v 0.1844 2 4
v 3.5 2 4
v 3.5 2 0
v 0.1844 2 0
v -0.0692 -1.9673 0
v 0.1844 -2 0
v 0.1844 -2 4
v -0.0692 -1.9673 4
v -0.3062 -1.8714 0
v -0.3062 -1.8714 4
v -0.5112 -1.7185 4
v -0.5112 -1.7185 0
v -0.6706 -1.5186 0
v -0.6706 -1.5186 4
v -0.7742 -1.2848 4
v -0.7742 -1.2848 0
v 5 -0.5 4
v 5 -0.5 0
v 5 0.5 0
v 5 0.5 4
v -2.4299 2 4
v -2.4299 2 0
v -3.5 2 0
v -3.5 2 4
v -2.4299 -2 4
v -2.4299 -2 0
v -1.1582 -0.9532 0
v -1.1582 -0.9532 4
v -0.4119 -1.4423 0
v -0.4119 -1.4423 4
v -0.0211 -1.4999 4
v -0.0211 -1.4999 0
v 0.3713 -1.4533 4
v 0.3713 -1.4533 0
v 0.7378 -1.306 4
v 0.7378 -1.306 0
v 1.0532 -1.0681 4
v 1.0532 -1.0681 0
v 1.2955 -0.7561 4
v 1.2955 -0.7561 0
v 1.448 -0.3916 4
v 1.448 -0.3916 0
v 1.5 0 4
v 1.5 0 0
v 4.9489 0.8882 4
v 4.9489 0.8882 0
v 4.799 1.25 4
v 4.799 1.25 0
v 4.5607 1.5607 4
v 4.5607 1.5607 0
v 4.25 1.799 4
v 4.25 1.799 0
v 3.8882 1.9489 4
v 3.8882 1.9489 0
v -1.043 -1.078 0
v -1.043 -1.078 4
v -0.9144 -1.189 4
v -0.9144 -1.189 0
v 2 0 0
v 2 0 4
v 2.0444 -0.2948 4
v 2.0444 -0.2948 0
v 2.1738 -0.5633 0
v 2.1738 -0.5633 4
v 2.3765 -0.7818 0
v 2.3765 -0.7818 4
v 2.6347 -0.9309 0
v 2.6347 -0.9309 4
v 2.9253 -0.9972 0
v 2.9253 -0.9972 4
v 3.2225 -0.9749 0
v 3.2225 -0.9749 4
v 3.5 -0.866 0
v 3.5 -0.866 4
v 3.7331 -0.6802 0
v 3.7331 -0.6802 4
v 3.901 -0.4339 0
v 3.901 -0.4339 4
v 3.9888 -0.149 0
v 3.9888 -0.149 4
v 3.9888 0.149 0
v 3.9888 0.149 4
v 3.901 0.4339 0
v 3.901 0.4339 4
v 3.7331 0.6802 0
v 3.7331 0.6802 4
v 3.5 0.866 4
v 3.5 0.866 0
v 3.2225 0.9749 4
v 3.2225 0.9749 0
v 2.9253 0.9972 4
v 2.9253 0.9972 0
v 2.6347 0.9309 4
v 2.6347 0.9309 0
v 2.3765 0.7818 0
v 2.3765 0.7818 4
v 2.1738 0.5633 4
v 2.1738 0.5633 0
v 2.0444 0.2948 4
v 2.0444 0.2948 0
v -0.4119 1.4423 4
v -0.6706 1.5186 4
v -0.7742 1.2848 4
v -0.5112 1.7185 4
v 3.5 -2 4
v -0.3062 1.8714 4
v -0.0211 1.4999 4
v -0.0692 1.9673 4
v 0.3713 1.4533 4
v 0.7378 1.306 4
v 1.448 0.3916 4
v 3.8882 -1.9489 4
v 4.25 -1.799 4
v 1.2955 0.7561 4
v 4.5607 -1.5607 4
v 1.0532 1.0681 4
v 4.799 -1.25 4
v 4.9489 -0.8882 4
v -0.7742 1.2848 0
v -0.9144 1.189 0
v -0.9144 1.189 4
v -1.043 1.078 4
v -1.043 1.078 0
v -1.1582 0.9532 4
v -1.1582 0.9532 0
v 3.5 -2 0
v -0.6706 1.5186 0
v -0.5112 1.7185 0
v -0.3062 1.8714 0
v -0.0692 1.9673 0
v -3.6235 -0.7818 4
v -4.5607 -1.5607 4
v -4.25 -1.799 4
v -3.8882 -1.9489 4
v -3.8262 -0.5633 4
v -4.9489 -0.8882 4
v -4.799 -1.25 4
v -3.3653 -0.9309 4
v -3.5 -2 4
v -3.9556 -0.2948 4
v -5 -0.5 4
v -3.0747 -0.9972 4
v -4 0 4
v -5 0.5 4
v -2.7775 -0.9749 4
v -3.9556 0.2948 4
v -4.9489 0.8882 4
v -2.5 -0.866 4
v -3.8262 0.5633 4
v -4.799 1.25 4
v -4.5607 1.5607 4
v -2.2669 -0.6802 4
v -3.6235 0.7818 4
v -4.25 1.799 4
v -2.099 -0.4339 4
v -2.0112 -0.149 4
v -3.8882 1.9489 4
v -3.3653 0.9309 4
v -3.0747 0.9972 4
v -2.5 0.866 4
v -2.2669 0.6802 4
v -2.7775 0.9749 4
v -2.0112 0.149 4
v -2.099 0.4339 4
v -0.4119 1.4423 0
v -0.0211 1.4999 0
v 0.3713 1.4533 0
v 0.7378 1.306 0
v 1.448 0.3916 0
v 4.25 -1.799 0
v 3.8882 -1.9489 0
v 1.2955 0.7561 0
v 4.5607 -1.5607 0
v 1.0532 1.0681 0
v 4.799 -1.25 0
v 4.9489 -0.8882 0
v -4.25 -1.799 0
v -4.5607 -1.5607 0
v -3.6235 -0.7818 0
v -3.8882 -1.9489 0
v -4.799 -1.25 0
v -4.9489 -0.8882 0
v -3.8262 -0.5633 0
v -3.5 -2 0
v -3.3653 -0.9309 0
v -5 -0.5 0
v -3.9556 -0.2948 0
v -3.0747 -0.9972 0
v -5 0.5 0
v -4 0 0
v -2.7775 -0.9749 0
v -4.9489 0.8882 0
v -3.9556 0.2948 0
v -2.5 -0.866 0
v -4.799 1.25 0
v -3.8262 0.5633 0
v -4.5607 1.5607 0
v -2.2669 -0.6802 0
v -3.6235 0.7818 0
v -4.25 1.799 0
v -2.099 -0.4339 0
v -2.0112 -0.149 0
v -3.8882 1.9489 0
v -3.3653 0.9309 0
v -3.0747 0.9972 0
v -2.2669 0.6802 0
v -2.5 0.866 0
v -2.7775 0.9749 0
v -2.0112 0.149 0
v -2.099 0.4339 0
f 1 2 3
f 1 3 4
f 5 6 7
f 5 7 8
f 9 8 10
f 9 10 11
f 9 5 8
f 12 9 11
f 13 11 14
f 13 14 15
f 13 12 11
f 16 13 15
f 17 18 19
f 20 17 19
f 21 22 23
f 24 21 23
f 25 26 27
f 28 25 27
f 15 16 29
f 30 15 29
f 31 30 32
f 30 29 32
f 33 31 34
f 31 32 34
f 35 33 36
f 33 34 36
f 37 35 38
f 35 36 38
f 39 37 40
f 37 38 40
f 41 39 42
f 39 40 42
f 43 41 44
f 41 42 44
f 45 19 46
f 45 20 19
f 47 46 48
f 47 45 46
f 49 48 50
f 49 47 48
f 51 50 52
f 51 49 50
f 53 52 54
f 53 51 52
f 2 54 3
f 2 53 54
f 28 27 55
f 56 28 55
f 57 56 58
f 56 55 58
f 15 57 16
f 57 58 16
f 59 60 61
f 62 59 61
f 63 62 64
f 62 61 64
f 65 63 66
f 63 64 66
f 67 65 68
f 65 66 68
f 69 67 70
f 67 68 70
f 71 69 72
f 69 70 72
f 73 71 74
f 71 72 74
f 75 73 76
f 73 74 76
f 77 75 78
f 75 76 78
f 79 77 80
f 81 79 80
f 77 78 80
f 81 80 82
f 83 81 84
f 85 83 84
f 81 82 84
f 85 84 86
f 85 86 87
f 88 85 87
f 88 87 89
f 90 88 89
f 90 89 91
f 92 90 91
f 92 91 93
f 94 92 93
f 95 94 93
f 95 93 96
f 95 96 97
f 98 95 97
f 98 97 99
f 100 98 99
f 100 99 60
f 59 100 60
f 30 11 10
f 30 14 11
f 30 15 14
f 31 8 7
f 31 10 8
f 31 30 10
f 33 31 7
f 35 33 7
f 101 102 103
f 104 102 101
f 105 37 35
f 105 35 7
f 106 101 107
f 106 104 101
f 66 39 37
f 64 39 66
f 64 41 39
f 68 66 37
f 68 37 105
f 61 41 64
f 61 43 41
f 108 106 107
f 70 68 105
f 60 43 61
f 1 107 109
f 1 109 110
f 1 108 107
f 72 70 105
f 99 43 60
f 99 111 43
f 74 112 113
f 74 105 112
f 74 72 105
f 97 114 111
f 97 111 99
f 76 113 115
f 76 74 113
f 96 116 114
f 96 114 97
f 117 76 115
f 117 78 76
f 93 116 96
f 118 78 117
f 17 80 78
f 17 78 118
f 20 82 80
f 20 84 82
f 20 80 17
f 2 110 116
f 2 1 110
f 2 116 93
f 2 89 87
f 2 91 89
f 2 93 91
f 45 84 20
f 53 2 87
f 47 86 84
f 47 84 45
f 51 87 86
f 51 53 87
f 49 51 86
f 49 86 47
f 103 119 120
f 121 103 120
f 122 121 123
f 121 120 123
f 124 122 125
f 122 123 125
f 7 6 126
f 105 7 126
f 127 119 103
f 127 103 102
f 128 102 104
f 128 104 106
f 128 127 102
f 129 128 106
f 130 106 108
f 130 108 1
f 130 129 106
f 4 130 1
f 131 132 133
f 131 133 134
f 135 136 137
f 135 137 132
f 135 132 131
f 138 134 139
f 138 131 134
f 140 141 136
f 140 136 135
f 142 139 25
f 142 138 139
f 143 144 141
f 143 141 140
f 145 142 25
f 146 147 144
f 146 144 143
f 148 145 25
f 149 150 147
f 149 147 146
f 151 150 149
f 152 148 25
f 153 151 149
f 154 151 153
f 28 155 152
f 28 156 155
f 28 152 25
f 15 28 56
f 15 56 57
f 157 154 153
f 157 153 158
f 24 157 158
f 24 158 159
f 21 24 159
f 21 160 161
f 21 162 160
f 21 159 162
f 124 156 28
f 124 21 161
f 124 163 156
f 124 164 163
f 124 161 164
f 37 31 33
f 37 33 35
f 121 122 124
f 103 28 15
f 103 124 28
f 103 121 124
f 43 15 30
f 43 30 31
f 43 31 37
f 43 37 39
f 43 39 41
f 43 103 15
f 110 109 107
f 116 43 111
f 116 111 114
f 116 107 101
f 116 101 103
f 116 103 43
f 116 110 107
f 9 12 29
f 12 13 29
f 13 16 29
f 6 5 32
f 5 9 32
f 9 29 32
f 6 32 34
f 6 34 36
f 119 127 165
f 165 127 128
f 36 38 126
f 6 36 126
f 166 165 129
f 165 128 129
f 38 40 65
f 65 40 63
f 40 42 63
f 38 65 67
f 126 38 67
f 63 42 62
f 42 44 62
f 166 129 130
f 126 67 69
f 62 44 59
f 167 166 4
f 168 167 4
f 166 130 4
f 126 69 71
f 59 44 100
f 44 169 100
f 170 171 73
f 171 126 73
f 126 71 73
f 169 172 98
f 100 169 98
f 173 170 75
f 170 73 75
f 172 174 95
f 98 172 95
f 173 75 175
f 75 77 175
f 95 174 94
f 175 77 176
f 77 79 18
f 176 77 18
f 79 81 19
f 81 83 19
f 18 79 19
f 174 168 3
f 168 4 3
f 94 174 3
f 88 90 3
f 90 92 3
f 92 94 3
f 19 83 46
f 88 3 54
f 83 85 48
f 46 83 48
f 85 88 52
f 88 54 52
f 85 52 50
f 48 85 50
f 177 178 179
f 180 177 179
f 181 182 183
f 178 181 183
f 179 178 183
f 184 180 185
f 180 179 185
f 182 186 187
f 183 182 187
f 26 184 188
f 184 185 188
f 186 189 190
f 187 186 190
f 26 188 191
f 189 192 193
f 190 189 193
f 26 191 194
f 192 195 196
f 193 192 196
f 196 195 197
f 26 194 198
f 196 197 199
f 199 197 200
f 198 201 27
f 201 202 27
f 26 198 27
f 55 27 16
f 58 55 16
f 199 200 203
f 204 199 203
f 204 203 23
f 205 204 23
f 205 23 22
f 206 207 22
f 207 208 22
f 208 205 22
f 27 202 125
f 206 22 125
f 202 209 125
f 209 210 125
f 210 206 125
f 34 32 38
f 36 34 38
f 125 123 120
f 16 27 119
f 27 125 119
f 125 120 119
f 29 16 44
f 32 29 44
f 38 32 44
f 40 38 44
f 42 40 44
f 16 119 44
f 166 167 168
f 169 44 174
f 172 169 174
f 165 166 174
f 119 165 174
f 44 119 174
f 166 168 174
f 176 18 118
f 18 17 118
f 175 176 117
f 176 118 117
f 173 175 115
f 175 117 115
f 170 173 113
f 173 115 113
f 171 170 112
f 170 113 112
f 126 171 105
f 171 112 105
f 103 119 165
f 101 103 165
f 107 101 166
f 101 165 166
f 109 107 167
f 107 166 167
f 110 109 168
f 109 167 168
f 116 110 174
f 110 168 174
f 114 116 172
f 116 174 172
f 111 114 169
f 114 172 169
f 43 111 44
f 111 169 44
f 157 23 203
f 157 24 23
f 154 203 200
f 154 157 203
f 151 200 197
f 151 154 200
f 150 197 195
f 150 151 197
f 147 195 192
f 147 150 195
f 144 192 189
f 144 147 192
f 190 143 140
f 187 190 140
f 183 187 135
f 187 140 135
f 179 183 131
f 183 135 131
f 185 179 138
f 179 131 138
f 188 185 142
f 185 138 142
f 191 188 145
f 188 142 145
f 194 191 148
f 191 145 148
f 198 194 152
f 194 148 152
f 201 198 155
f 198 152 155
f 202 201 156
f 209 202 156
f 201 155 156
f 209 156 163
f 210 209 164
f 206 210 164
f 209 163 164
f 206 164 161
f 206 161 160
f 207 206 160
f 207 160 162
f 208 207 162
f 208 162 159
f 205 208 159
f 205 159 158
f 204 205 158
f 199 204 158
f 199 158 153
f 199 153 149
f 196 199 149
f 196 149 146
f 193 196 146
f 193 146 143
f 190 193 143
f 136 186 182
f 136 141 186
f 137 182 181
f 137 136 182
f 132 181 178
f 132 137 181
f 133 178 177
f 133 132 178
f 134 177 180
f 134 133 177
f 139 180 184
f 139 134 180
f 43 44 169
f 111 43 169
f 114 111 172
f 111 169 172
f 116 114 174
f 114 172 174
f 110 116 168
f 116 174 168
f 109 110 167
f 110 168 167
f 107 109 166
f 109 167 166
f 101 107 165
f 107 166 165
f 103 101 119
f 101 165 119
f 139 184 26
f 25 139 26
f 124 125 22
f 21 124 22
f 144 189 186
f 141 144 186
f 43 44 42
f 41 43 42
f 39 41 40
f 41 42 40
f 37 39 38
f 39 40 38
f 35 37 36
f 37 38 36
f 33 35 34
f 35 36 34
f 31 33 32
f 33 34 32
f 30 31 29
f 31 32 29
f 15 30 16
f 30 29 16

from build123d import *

# Parameters (mm, degrees)
F1_DEPTH    = 4
F2_DEPTH    = 4
F3_R        = 1.5
F3_2_R      = 1.5
F4_T1_DEPTH = 13.1378583471
F5_D        = 2
F5_2_D      = 2


# Not quite as in the source:
# - a fillet or chamfer that OpenCascade refuses, or shapes differently, is made with other operations: its cross-section is extruded or revolved along the edge and cut away or added


with BuildPart() as f1:
    # F0 (on Top) → F1 (new body)
    with BuildSketch(Plane.XY):
        with BuildLine():
            Line((-1.1581599978, 0.9532394345), (-2.4299456272, 2))
            Line((-2.4299456272, 2), (-5, 2))
            Line((-5, 2), (-5, -2))
            Line((-5, -2), (-2.4299456272, -2))
            Line((-2.4299456272, -2), (-1.1581599978, -0.9532394345))
            ThreePointArc((-1.1581599978, -0.9532394345), (-1.5, 0), (-1.1581599978, 0.9532394345))
        make_face()
        with BuildLine():
            ThreePointArc((1.5, 0), (0.7378123545, 1.3059988245), (-0.7741772393, 1.2847760902))
            ThreePointArc((-0.7741772393, 1.2847760902), (-0.9802861511, 1.135358561), (-1.1581599978, 0.9532394345))
            ThreePointArc((-1.1581599978, 0.9532394345), (-1.5, 0), (-1.1581599978, -0.9532394345))
            ThreePointArc((-1.1581599978, -0.9532394345), (-0.9802861511, -1.135358561), (-0.7741772393, -1.2847760902))
            ThreePointArc((-0.7741772393, -1.2847760902), (0.7378123545, -1.3059988245), (1.5, 0))
        make_face()
    extrude(amount=F1_DEPTH)

    # F3
    f3_edges = [f1.edges().sort_by_distance(p)[0] for p in [
        (-5, -2, 2),
        (-5, 2, 2),
    ]]
    fillet(f3_edges, radius=F3_R)

    # F5 (through all)
    with Locations(Plane(origin=(0, 0, 0), x_dir=(1, 0, 0), z_dir=(0, 0, -1))):
        with Locations((3, 0), (-3, 0)):
            Hole(F5_D / 2)


with BuildPart() as f2:
    # F0 (on Top) → F2 (new body)
    with BuildSketch(Plane.XY):
        with BuildLine():
            Line((5, -2), (5, 2))
            Line((5, 2), (-1.6431548453, 2))
            Line((-1.6431548453, 2), (-0.7741772393, 1.2847760902))
            ThreePointArc((-0.7741772393, 1.2847760902), (0.7378123545, 1.3059988245), (1.5, 0))
            ThreePointArc((1.5, 0), (0.7378123545, -1.3059988245), (-0.7741772393, -1.2847760902))
            Line((-0.7741772393, -1.2847760902), (-1.6431548453, -2))
            Line((-1.6431548453, -2), (5, -2))
        make_face()
    extrude(amount=F2_DEPTH)

    # F3#2
    f3_2_edges = [f2.edges().sort_by_distance(p)[0] for p in [
        (5, -2, 2),
        (5, 2, 2),
    ]]
    fillet(f3_2_edges, radius=F3_2_R)

    # F4: fillet of radius 1 on 2 edges, made by hand

    # F4_s2 → F4_t1 (cut)
    with BuildSketch(Plane.XY.offset(-4.5689291735)):
        with BuildLine():
            ThreePointArc((-0.7741772393, 1.2847760902), (-0.4135898271, 1.8014911385), (0.1844168241, 2))
            Line((0.1844168241, 2), (-1.6431548453, 2))
            Line((-1.6431548453, 2), (-0.7741772393, 1.2847760902))
        make_face()
        with BuildLine():
            ThreePointArc((0.1844168241, -2), (-0.4135898271, -1.8014911385), (-0.7741772393, -1.2847760902))
            Line((-0.7741772393, -1.2847760902), (-1.6431548453, -2))
            Line((-1.6431548453, -2), (0.1844168241, -2))
        make_face()
    extrude(amount=F4_T1_DEPTH, mode=Mode.SUBTRACT)

    # F5#2 (through all)
    with Locations(Plane(origin=(0, 0, 0), x_dir=(1, 0, 0), z_dir=(0, 0, -1))):
        with Locations((3, 0), (-3, 0)):
            Hole(F5_2_D / 2)


solid = Compound([f1.part, f2.part])
